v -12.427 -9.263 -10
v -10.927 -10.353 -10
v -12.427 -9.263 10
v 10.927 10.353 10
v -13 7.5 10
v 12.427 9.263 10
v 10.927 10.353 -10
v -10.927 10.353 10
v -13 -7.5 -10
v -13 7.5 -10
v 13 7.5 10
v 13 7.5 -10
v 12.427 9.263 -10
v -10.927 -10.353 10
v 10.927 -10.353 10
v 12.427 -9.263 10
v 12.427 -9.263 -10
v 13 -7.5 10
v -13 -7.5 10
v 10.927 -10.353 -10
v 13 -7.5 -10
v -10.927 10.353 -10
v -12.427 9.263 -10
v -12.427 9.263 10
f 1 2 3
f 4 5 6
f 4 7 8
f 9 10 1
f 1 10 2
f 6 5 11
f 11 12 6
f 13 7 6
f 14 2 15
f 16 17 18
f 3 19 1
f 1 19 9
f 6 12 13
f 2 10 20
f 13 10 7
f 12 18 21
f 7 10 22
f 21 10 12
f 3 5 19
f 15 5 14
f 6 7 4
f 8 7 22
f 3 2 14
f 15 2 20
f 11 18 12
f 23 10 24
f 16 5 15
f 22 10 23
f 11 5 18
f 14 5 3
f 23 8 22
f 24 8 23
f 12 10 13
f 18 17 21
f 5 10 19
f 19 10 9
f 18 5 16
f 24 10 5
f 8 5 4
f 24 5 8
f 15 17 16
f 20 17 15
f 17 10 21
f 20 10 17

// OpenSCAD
// Rung 2: hull() of 4 equal-radius, equal-span parallel cylinders (the
// "rounded box from corner posts" idiom) -> 2D hull of axis points, offset,
// extruded.
hull() {
    translate([-10,-7.5,0]) cylinder(h=20, r=3, center=true);
    translate([10,-7.5,0]) cylinder(h=20, r=3, center=true);
    translate([-10,7.5,0]) cylinder(h=20, r=3, center=true);
    translate([10,7.5,0]) cylinder(h=20, r=3, center=true);
}
